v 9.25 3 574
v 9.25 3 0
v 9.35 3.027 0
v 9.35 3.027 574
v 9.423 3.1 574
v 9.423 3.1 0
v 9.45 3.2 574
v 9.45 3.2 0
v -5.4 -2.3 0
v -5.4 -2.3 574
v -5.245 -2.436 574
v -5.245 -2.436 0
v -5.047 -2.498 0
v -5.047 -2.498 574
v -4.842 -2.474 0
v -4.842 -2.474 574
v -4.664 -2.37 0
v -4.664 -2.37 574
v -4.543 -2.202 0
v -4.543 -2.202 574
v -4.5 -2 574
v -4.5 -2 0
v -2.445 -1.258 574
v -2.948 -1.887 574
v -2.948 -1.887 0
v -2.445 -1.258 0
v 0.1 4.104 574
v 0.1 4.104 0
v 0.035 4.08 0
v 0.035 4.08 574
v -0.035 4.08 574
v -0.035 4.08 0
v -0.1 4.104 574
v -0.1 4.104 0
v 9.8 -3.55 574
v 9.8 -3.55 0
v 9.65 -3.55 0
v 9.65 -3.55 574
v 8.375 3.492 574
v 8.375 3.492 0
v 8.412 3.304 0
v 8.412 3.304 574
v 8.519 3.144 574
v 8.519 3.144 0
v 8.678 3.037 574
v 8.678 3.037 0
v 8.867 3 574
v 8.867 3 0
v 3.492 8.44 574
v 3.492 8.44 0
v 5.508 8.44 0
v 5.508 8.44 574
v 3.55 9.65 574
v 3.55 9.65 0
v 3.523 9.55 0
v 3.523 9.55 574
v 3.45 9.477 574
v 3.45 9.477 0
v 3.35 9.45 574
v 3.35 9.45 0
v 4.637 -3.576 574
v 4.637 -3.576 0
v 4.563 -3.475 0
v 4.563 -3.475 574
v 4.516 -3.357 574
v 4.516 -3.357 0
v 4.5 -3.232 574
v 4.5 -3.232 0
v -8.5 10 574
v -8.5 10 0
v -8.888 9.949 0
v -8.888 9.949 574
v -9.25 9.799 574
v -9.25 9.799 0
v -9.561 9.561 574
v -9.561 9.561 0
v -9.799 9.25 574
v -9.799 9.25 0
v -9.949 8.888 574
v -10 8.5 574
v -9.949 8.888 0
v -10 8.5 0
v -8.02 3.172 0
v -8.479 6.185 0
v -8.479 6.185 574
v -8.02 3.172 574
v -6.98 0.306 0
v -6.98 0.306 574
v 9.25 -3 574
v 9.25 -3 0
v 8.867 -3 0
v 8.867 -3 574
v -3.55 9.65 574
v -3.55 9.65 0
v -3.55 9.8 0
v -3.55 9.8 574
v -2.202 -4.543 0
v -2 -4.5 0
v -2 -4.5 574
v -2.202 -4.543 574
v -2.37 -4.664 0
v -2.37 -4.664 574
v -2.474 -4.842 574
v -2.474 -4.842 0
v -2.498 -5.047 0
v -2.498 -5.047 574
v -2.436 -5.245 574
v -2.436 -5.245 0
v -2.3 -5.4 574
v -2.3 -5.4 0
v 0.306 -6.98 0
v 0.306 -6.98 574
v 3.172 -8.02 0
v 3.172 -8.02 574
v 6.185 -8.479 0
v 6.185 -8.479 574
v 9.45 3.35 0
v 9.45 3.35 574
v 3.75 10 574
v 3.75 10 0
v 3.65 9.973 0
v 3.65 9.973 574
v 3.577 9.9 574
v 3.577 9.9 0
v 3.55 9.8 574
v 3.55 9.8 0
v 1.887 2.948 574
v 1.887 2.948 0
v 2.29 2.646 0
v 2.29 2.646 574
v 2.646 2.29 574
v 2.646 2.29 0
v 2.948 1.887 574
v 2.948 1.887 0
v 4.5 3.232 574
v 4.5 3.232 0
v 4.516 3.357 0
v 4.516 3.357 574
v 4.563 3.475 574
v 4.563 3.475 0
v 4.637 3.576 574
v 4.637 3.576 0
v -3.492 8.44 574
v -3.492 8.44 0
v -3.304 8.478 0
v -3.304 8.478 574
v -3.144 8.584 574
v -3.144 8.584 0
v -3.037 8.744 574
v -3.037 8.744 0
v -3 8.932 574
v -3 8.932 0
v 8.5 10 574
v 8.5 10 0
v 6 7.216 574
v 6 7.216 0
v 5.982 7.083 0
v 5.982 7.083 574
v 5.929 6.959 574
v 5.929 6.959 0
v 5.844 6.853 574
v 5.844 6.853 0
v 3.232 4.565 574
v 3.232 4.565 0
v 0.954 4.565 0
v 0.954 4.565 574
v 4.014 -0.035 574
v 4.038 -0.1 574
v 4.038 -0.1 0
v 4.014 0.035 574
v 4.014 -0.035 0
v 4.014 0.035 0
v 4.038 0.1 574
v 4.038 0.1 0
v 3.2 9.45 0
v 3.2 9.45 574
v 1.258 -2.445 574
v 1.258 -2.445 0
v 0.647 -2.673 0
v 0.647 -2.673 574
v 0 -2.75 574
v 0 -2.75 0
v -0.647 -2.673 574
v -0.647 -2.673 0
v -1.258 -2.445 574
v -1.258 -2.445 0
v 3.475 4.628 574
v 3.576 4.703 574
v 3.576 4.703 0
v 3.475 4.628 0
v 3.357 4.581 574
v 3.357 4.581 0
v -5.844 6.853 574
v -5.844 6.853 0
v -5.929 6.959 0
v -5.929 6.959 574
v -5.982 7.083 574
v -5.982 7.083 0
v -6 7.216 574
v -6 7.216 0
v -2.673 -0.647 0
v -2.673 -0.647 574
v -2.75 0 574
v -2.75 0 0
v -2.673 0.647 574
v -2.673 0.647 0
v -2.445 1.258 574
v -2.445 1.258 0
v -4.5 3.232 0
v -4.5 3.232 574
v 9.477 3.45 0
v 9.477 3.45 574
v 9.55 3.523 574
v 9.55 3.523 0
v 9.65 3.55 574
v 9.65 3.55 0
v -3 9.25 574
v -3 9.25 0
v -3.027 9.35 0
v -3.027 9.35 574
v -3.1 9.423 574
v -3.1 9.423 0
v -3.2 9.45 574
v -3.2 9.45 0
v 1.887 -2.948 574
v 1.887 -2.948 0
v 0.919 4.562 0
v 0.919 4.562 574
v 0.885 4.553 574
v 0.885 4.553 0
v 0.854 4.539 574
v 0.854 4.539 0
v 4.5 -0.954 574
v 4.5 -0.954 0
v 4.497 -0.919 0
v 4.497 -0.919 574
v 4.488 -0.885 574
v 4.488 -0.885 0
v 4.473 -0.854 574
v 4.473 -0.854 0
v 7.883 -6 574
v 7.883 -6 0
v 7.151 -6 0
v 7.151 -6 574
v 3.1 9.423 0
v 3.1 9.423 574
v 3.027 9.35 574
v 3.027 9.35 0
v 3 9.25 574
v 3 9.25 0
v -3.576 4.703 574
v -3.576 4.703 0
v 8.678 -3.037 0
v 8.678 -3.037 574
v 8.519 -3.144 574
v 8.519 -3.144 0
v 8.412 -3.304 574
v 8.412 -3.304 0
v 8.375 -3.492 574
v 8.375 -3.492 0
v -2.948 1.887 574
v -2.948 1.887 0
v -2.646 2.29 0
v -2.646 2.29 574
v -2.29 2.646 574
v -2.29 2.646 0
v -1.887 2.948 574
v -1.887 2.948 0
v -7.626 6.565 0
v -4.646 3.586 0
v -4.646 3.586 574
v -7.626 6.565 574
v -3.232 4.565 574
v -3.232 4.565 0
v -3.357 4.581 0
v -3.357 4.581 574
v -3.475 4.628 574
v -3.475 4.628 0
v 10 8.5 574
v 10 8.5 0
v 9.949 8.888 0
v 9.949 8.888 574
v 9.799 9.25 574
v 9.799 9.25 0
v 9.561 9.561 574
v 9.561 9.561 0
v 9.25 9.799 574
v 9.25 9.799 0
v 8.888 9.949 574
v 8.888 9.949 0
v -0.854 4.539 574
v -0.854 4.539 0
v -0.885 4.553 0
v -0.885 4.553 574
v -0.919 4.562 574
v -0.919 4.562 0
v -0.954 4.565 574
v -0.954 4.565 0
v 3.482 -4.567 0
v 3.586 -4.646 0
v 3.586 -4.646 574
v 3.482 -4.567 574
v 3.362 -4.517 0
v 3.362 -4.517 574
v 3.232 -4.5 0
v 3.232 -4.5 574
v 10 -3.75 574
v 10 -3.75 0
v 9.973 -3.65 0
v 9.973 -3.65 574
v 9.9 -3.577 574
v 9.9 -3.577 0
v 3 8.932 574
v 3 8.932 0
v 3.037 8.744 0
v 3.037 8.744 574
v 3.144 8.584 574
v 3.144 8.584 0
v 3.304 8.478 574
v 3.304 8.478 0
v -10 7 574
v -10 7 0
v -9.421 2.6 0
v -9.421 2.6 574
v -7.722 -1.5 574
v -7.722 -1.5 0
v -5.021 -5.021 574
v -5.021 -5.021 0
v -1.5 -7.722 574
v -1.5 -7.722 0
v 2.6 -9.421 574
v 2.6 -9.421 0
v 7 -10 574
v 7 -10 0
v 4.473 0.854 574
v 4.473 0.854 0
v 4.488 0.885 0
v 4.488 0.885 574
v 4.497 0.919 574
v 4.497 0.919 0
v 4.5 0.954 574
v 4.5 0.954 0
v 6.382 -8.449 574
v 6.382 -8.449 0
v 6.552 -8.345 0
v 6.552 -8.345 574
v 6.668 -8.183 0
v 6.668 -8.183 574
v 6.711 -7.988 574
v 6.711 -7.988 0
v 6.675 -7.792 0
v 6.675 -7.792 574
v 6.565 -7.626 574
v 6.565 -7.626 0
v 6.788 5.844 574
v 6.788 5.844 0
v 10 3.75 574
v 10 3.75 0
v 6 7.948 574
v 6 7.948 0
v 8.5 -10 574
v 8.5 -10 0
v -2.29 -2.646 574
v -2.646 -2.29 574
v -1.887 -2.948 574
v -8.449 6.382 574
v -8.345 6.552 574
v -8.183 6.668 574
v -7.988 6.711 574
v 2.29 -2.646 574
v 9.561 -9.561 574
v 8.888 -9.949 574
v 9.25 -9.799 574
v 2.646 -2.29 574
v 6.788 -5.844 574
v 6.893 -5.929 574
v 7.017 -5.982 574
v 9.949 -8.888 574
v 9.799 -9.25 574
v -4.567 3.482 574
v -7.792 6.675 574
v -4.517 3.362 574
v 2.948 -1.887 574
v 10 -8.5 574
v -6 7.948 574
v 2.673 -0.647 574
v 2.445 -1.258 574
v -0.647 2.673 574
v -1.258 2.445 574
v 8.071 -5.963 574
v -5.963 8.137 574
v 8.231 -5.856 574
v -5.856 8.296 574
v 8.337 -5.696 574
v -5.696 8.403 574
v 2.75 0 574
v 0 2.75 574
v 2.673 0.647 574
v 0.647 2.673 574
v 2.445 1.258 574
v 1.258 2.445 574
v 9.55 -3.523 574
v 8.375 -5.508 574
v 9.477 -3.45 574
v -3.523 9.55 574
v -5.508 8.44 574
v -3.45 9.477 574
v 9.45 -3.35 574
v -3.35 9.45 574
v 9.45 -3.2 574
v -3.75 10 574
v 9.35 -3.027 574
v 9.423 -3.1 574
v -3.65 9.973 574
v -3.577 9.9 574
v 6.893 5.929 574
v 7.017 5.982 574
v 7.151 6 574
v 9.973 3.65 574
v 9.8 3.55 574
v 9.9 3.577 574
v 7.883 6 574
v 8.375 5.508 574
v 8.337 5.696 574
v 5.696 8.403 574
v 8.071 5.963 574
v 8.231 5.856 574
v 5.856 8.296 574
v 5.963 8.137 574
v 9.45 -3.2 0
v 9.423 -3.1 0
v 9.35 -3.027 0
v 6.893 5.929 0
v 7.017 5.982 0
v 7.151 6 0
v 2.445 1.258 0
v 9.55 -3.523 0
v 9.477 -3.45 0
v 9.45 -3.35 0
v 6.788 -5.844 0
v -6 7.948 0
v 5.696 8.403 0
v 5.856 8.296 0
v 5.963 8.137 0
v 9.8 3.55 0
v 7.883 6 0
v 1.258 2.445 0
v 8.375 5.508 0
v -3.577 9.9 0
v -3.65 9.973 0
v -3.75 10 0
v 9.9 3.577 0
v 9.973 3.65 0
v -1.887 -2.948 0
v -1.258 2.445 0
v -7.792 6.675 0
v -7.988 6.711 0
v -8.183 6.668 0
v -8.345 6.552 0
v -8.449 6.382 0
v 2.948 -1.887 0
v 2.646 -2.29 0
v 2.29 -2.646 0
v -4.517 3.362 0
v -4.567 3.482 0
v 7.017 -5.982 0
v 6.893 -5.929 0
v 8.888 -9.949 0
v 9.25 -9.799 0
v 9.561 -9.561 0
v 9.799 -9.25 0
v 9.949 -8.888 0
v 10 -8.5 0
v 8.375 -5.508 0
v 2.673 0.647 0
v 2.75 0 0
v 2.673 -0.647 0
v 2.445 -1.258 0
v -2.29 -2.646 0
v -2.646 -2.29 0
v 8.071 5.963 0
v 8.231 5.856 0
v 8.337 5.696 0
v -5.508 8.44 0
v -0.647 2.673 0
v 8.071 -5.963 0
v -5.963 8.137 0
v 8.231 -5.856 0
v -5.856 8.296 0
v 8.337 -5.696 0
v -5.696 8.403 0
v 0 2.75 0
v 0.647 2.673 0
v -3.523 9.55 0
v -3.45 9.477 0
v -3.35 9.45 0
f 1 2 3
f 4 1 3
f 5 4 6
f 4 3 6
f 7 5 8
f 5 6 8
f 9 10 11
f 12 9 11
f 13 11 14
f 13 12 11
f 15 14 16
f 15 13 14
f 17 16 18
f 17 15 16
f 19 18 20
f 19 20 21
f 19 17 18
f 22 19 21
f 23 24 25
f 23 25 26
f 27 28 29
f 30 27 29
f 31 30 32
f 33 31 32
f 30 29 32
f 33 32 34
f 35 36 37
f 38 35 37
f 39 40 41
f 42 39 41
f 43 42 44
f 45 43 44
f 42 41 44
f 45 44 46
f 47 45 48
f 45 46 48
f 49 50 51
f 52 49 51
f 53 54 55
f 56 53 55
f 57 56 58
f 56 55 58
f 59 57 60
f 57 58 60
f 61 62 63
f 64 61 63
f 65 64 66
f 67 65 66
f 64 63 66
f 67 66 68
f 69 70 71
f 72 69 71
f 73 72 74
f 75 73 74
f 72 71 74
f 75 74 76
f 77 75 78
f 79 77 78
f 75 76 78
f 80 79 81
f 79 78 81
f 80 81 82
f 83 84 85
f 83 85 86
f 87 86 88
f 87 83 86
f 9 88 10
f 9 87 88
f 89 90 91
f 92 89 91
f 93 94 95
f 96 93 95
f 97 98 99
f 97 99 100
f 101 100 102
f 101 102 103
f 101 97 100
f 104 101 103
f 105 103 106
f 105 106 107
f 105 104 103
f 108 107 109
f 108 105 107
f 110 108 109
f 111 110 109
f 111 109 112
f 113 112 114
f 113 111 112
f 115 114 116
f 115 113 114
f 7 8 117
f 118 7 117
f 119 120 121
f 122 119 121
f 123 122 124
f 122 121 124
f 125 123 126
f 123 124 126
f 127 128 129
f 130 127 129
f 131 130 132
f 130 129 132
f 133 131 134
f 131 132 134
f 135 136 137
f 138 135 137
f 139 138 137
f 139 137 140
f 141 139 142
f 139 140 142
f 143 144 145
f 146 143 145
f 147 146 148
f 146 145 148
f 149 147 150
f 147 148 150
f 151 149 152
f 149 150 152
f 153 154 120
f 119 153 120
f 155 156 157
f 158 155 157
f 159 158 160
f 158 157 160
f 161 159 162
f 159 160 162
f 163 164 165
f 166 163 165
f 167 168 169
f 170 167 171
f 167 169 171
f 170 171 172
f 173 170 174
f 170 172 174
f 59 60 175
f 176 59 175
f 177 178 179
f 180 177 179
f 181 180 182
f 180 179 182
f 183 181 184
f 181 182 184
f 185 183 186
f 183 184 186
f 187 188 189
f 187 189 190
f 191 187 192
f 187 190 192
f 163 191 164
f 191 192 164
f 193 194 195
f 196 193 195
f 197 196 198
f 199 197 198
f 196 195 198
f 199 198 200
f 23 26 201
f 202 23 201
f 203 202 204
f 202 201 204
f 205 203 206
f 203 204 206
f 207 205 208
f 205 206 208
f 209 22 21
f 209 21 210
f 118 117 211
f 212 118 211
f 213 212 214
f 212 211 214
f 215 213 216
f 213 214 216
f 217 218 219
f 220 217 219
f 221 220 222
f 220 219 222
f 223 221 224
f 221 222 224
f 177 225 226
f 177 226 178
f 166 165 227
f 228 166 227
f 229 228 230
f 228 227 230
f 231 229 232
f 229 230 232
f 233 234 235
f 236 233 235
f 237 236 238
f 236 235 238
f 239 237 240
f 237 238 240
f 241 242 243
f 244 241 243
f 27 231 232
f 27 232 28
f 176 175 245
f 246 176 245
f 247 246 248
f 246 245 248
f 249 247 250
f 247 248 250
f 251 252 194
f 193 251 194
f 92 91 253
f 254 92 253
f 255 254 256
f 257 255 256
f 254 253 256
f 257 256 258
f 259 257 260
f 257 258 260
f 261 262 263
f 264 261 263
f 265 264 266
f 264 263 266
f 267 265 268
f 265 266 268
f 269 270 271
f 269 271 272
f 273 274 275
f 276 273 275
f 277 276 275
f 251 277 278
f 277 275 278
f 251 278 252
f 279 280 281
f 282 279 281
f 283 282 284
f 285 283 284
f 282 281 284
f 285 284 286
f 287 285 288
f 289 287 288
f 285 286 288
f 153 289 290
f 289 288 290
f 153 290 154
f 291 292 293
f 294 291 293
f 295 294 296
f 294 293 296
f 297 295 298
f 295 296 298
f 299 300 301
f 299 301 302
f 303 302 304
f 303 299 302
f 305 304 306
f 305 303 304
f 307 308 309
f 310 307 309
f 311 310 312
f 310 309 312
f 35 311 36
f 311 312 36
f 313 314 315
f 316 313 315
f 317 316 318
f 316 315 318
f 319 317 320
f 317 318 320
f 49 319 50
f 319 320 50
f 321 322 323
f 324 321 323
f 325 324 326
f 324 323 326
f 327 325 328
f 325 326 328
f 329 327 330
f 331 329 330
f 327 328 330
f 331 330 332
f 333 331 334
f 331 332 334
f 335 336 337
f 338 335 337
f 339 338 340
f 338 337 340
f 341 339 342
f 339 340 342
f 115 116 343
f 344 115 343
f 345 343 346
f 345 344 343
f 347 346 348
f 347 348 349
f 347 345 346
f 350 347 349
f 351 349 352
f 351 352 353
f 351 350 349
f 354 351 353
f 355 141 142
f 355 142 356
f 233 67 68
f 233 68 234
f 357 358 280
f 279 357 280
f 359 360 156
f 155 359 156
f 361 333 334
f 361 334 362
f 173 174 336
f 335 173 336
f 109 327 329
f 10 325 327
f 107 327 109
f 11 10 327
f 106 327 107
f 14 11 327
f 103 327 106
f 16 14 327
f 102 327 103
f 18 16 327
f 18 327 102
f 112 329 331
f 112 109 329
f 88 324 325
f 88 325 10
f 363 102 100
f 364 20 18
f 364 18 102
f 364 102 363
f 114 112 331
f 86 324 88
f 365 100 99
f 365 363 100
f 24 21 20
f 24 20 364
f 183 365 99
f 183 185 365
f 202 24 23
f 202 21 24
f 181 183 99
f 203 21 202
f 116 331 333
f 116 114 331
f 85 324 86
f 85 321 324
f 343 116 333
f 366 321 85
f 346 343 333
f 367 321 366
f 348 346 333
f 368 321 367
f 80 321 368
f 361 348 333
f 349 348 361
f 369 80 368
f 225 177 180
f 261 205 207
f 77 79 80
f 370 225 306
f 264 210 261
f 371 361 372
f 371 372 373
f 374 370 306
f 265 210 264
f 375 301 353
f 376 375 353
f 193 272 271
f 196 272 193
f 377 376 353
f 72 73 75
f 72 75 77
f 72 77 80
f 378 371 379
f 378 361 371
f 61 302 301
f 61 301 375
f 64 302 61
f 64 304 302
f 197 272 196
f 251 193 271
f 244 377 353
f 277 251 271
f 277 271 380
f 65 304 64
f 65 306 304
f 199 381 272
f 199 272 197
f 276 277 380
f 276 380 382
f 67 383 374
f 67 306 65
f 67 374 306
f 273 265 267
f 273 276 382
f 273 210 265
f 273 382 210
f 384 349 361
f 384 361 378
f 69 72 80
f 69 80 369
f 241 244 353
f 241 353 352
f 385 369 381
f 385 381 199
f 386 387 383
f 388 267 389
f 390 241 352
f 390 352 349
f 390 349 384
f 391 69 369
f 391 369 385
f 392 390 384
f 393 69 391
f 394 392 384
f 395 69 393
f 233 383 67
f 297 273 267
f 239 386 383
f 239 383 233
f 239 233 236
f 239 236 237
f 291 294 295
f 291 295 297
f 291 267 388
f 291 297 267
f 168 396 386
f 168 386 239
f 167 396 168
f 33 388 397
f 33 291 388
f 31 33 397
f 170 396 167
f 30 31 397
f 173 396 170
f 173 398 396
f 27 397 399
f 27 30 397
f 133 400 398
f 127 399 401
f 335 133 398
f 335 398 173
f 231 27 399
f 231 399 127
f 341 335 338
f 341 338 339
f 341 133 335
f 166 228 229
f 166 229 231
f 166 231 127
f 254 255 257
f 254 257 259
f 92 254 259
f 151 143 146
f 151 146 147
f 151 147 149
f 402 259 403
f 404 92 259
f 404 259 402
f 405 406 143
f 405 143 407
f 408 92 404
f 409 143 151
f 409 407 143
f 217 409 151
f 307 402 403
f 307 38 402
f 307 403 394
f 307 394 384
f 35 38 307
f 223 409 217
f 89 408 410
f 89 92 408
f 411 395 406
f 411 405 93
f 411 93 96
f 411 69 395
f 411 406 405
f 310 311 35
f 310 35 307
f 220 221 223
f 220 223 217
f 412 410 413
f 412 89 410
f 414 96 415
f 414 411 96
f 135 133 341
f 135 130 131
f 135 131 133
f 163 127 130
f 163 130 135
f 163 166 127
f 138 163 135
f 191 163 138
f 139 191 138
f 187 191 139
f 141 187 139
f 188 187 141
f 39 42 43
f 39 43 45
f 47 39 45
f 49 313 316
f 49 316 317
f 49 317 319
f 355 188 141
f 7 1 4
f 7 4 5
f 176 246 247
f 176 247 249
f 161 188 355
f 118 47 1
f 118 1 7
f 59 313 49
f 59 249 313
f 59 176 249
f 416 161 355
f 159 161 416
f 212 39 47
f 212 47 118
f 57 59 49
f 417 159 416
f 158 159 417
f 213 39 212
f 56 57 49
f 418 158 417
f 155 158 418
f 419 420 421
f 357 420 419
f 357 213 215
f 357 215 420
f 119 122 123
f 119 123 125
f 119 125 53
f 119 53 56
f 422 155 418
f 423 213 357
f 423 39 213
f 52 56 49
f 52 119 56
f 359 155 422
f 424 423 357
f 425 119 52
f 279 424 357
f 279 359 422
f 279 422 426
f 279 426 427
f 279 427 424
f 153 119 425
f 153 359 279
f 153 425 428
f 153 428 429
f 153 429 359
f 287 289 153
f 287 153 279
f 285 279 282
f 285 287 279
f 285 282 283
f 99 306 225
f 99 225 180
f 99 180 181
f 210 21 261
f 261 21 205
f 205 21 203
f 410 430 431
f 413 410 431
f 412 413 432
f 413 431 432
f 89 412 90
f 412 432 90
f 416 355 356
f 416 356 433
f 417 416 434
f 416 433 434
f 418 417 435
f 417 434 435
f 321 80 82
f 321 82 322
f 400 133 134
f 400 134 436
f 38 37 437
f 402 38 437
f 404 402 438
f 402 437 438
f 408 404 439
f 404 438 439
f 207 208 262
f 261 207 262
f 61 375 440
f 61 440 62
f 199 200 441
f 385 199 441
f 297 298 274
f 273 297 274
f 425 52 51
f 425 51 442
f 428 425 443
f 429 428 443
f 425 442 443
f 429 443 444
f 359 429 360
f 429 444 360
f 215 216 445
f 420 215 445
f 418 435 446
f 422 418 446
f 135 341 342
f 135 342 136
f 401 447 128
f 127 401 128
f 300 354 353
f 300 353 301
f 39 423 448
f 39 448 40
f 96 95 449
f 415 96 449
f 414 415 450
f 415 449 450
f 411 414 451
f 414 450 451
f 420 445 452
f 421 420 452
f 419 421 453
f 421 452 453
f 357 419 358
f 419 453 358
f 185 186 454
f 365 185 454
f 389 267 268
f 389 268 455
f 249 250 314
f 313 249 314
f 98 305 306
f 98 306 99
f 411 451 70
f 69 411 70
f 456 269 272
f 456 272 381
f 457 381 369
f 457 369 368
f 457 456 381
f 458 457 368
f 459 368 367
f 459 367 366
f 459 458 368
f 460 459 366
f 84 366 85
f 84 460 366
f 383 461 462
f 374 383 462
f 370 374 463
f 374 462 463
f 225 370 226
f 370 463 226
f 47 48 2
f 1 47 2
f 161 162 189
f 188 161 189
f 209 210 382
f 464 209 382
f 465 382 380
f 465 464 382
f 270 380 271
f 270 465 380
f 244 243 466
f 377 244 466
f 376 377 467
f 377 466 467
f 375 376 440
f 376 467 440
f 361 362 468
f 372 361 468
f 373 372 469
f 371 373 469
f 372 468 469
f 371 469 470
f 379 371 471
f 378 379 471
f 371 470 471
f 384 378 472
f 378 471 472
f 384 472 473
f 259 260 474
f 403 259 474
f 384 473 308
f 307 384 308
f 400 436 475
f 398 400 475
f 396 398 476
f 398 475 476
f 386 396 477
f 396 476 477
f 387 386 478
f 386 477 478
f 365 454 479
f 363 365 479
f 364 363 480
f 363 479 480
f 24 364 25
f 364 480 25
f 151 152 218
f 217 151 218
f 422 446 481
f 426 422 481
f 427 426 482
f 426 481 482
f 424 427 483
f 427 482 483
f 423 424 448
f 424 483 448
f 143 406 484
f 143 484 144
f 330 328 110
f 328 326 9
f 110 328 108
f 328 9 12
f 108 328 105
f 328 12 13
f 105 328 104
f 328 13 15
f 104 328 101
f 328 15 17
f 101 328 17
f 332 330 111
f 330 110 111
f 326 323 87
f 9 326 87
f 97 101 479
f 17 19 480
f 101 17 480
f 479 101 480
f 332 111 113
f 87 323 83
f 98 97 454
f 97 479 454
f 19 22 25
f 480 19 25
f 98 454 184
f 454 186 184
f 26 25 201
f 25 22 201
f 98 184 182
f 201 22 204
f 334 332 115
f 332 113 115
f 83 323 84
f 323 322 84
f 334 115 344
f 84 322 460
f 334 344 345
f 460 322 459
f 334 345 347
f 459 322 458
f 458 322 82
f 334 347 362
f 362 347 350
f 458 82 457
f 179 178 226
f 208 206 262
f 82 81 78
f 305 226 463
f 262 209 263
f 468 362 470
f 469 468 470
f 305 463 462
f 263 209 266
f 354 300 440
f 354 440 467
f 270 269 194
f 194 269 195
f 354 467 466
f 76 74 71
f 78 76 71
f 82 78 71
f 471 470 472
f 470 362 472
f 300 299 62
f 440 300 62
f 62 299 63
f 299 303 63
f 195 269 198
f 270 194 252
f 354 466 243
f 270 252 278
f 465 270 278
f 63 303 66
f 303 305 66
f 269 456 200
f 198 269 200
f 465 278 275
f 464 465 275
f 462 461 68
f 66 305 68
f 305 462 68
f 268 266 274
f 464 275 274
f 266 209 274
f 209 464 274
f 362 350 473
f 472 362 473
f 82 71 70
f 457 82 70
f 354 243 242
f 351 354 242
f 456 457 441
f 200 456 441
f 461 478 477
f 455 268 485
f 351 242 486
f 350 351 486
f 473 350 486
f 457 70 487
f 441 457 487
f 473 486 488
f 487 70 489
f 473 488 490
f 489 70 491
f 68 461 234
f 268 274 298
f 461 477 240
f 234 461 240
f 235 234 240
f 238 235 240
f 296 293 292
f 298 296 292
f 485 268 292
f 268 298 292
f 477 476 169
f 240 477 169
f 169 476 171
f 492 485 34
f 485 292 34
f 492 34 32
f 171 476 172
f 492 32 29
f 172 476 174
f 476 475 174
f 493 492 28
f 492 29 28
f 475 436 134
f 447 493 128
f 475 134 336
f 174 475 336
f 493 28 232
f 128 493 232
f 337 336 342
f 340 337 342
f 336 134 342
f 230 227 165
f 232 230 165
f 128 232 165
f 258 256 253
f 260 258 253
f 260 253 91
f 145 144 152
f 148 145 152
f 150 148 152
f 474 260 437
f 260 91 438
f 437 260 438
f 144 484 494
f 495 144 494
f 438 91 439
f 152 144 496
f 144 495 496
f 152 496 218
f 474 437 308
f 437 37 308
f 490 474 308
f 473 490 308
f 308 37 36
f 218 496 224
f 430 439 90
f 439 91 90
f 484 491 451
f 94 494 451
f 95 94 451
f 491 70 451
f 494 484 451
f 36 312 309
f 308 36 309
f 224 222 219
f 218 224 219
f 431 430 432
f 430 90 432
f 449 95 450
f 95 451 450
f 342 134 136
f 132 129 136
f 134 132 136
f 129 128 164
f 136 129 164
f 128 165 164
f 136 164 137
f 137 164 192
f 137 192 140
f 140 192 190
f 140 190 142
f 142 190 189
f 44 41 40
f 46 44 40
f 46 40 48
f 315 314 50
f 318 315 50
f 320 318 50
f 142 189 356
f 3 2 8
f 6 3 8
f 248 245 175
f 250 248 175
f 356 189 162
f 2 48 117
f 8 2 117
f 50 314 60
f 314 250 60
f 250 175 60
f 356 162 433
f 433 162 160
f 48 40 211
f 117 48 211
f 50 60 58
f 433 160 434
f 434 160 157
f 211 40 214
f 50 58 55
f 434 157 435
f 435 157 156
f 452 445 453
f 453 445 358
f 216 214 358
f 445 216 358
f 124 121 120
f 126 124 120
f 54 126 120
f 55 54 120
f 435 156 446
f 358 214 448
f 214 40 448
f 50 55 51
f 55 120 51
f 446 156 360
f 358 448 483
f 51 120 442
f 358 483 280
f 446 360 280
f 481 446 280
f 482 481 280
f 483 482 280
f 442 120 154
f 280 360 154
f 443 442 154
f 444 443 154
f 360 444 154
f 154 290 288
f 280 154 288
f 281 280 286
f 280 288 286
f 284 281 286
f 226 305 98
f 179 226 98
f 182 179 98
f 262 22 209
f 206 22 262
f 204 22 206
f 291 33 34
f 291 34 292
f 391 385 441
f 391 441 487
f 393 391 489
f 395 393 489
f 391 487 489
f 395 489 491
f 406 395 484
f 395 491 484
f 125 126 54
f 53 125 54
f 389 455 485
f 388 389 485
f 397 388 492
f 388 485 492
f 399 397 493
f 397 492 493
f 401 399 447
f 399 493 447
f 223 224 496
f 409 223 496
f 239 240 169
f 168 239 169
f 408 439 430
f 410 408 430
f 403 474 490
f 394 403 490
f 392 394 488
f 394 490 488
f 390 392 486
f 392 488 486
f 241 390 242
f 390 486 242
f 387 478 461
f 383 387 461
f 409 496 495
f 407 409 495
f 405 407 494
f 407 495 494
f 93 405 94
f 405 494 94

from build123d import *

# Parameters (mm, degrees)
EXTRUDE1_DEPTH = 574


with BuildPart() as part:
    # Sketch1 → Extrude1 (new body)
    with BuildSketch(Plane.XY):
        with BuildLine():
            Line((3.232233116, 4.565447254), (0.953589838, 4.565447254))
            ThreePointArc((0.953589838, 4.565447254), (0.901826028, 4.558632419), (0.853589836, 4.538652333))
            Line((0.853589836, 4.538652333), (0.100000003, 4.103567024))
            ThreePointArc((0.100000003, 4.103567024), (0, 4.076772104), (-0.100000003, 4.103567024))
            Line((-0.100000003, 4.103567024), (-0.853589836, 4.538652333))
            ThreePointArc((-0.853589836, 4.538652333), (-0.901826028, 4.558632419), (-0.953589838, 4.565447254))
            Line((-0.953589838, 4.565447254), (-3.232233116, 4.565447254))
            ThreePointArc((-3.232233116, 4.565447254), (-3.417445277, 4.601015929), (-3.576306433, 4.702661433))
            Line((-3.576306433, 4.702661433), (-5.844073317, 6.853456827))
            ThreePointArc((-5.844073317, 6.853456827), (-5.959367314, 7.018804885), (-6, 7.216242649))
            Line((-6, 7.216242649), (-6, 7.948478858))
            ThreePointArc((-6, 7.948478858), (-5.855954134, 8.296236342), (-5.50819665, 8.440282208))
            Line((-5.50819665, 8.440282208), (-3.49180335, 8.440282208))
            ThreePointArc((-3.49180335, 8.440282208), (-3.144045866, 8.584328074), (-3, 8.932085558))
            Line((-3, 8.932085558), (-3, 9.249999634))
            ThreePointArc((-3, 9.249999634), (-3.058578644, 9.39142099), (-3.2, 9.449999634))
            Line((-3.2, 9.449999634), (-3.350000366, 9.449999634))
            ThreePointArc((-3.350000366, 9.449999634), (-3.491421722, 9.508578278), (-3.550000366, 9.649999634))
            Line((-3.550000366, 9.649999634), (-3.550000366, 9.8))
            ThreePointArc((-3.550000366, 9.8), (-3.60857901, 9.941421356), (-3.750000366, 10))
            Line((-3.750000366, 10), (-8.50000115, 10))
            ThreePointArc((-8.50000115, 10), (-9.560660508, 9.560660508), (-10, 8.50000115))
            Line((-10, 8.50000115), (-10, 7))
            ThreePointArc((-10, 7), (-5.02081528, -5.02081528), (7, -10))
            Line((7, -10), (8.50000115, -10))
            ThreePointArc((8.50000115, -10), (9.560660508, -9.560660508), (10, -8.50000115))
            Line((10, -8.50000115), (10, -3.750000366))
            ThreePointArc((10, -3.750000366), (9.941421356, -3.60857901), (9.8, -3.550000366))
            Line((9.8, -3.550000366), (9.649999634, -3.550000366))
            ThreePointArc((9.649999634, -3.550000366), (9.508578278, -3.491421722), (9.449999634, -3.350000366))
            Line((9.449999634, -3.350000366), (9.449999634, -3.2))
            ThreePointArc((9.449999634, -3.2), (9.39142099, -3.058578644), (9.249999634, -3))
            Line((9.249999634, -3), (8.866638303, -3))
            ThreePointArc((8.866638303, -3), (8.518880819, -3.144045866), (8.374834953, -3.49180335))
            Line((8.374834953, -3.49180335), (8.374834953, -5.50819665))
            ThreePointArc((8.374834953, -5.50819665), (8.230789087, -5.855954134), (7.883031603, -6))
            Line((7.883031603, -6), (7.150795394, -6))
            ThreePointArc((7.150795394, -6), (6.95335763, -5.959367314), (6.788009572, -5.844073317))
            Line((6.788009572, -5.844073317), (4.637214178, -3.576306432))
            ThreePointArc((4.637214178, -3.576306432), (4.535568675, -3.417445276), (4.5, -3.232233115))
            Line((4.5, -3.232233115), (4.5, -0.953589838))
            ThreePointArc((4.5, -0.953589838), (4.493185165, -0.901826026), (4.473205078, -0.853589834))
            Line((4.473205078, -0.853589834), (4.038119764, -0.100000004))
            ThreePointArc((4.038119764, -0.100000004), (4.011324842, 0), (4.038119764, 0.100000004))
            Line((4.038119764, 0.100000004), (4.473205078, 0.853589834))
            ThreePointArc((4.473205078, 0.853589834), (4.493185165, 0.901826026), (4.5, 0.953589838))
            Line((4.5, 0.953589838), (4.5, 3.232233115))
            ThreePointArc((4.5, 3.232233115), (4.535568675, 3.417445276), (4.637214178, 3.576306432))
            Line((4.637214178, 3.576306432), (6.788009572, 5.844073317))
            ThreePointArc((6.788009572, 5.844073317), (6.95335763, 5.959367314), (7.150795394, 6))
            Line((7.150795394, 6), (7.883031603, 6))
            ThreePointArc((7.883031603, 6), (8.230789087, 5.855954134), (8.374834953, 5.50819665))
            Line((8.374834953, 5.50819665), (8.374834953, 3.49180335))
            ThreePointArc((8.374834953, 3.49180335), (8.518880819, 3.144045866), (8.866638303, 3))
            Line((8.866638303, 3), (9.249999634, 3))
            ThreePointArc((9.249999634, 3), (9.39142099, 3.058578644), (9.449999634, 3.2))
            Line((9.449999634, 3.2), (9.449999634, 3.350000366))
            ThreePointArc((9.449999634, 3.350000366), (9.508578278, 3.491421722), (9.649999634, 3.550000366))
            Line((9.649999634, 3.550000366), (9.8, 3.550000366))
            ThreePointArc((9.8, 3.550000366), (9.941421356, 3.60857901), (10, 3.750000366))
            Line((10, 3.750000366), (10, 8.50000115))
            ThreePointArc((10, 8.50000115), (9.560660508, 9.560660508), (8.50000115, 10))
            Line((8.50000115, 10), (3.750000366, 10))
            ThreePointArc((3.750000366, 10), (3.60857901, 9.941421356), (3.550000366, 9.8))
            Line((3.550000366, 9.8), (3.550000366, 9.649999634))
            ThreePointArc((3.550000366, 9.649999634), (3.491421722, 9.508578278), (3.350000366, 9.449999634))
            Line((3.350000366, 9.449999634), (3.2, 9.449999634))
            ThreePointArc((3.2, 9.449999634), (3.058578644, 9.39142099), (3, 9.249999634))
            Line((3, 9.249999634), (3, 8.932085558))
            ThreePointArc((3, 8.932085558), (3.144045866, 8.584328074), (3.49180335, 8.440282208))
            Line((3.49180335, 8.440282208), (5.50819665, 8.440282208))
            ThreePointArc((5.50819665, 8.440282208), (5.855954134, 8.296236342), (6, 7.948478858))
            Line((6, 7.948478858), (6, 7.216242649))
            ThreePointArc((6, 7.216242649), (5.959367314, 7.018804885), (5.844073317, 6.853456827))
            Line((5.844073317, 6.853456827), (3.576306433, 4.702661433))
            ThreePointArc((3.576306433, 4.702661433), (3.417445277, 4.601015929), (3.232233116, 4.565447254))
        make_face()
        with BuildLine():
            Line((1.258185436, 2.445295362), (1.887055008, 2.947714945))
            ThreePointArc((1.887055008, 2.947714945), (2.474873794, 2.474873674), (2.947715037, 1.887054865))
            Line((2.947715037, 1.887054865), (2.445295423, 1.258185317))
            ThreePointArc((2.445295423, 1.258185317), (2.75, -6.7e-08), (2.445295362, -1.258185436))
            Line((2.445295362, -1.258185436), (2.947714945, -1.887055008))
            ThreePointArc((2.947714945, -1.887055008), (2.474873674, -2.474873794), (1.887054865, -2.947715037))
            Line((1.887054865, -2.947715037), (1.258185317, -2.445295423))
            ThreePointArc((1.258185317, -2.445295423), (-6.7e-08, -2.75), (-1.258185436, -2.445295362))
            Line((-1.258185436, -2.445295362), (-1.887055008, -2.947714945))
            ThreePointArc((-1.887055008, -2.947714945), (-2.474873794, -2.474873674), (-2.947715037, -1.887054865))
            Line((-2.947715037, -1.887054865), (-2.445295423, -1.258185317))
            ThreePointArc((-2.445295423, -1.258185317), (-2.75, 6.7e-08), (-2.445295362, 1.258185436))
            Line((-2.445295362, 1.258185436), (-2.947714945, 1.887055008))
            ThreePointArc((-2.947714945, 1.887055008), (-2.474873674, 2.474873794), (-1.887054865, 2.947715037))
            Line((-1.887054865, 2.947715037), (-1.258185317, 2.445295423))
            ThreePointArc((-1.258185317, 2.445295423), (6.7e-08, 2.75), (1.258185436, 2.445295362))
        make_face(mode=Mode.SUBTRACT)
        with BuildLine():
            Line((3.232233163, -4.499999714), (-2.000000051, -4.499999587))
            ThreePointArc((-2.000000051, -4.499999587), (-2.474341709, -4.841885693), (-2.300000072, -5.399999581))
            ThreePointArc((-2.300000072, -5.399999581), (1.713541858, -7.57063318), (6.185210557, -8.478569349))
            ThreePointArc((6.185210557, -8.478569349), (6.668243282, -8.182681825), (6.565047479, -7.625707261))
            Line((6.565047479, -7.625707261), (3.585786542, -4.646446324))
            ThreePointArc((3.585786542, -4.646446324), (3.423574873, -4.53805995), (3.232233163, -4.499999714))
        make_face(mode=Mode.SUBTRACT)
        with BuildLine():
            Line((-4.646446492, 3.585787135), (-7.625707283, 6.565048217))
            ThreePointArc((-7.625707283, 6.565048217), (-8.182681843, 6.668244047), (-8.47856939, 6.185211338))
            ThreePointArc((-8.47856939, 6.185211338), (-7.570633447, 1.713542596), (-5.400000054, -2.299999441))
            ThreePointArc((-5.400000054, -2.299999441), (-4.841886176, -2.474341107), (-4.500000045, -1.999999467))
            Line((-4.500000045, -1.999999467), (-4.499999899, 3.232233748))
            ThreePointArc((-4.499999899, 3.232233748), (-4.538060126, 3.42357546), (-4.646446492, 3.585787135))
        make_face(mode=Mode.SUBTRACT)
    extrude(amount=EXTRUDE1_DEPTH)


solid = part.part
